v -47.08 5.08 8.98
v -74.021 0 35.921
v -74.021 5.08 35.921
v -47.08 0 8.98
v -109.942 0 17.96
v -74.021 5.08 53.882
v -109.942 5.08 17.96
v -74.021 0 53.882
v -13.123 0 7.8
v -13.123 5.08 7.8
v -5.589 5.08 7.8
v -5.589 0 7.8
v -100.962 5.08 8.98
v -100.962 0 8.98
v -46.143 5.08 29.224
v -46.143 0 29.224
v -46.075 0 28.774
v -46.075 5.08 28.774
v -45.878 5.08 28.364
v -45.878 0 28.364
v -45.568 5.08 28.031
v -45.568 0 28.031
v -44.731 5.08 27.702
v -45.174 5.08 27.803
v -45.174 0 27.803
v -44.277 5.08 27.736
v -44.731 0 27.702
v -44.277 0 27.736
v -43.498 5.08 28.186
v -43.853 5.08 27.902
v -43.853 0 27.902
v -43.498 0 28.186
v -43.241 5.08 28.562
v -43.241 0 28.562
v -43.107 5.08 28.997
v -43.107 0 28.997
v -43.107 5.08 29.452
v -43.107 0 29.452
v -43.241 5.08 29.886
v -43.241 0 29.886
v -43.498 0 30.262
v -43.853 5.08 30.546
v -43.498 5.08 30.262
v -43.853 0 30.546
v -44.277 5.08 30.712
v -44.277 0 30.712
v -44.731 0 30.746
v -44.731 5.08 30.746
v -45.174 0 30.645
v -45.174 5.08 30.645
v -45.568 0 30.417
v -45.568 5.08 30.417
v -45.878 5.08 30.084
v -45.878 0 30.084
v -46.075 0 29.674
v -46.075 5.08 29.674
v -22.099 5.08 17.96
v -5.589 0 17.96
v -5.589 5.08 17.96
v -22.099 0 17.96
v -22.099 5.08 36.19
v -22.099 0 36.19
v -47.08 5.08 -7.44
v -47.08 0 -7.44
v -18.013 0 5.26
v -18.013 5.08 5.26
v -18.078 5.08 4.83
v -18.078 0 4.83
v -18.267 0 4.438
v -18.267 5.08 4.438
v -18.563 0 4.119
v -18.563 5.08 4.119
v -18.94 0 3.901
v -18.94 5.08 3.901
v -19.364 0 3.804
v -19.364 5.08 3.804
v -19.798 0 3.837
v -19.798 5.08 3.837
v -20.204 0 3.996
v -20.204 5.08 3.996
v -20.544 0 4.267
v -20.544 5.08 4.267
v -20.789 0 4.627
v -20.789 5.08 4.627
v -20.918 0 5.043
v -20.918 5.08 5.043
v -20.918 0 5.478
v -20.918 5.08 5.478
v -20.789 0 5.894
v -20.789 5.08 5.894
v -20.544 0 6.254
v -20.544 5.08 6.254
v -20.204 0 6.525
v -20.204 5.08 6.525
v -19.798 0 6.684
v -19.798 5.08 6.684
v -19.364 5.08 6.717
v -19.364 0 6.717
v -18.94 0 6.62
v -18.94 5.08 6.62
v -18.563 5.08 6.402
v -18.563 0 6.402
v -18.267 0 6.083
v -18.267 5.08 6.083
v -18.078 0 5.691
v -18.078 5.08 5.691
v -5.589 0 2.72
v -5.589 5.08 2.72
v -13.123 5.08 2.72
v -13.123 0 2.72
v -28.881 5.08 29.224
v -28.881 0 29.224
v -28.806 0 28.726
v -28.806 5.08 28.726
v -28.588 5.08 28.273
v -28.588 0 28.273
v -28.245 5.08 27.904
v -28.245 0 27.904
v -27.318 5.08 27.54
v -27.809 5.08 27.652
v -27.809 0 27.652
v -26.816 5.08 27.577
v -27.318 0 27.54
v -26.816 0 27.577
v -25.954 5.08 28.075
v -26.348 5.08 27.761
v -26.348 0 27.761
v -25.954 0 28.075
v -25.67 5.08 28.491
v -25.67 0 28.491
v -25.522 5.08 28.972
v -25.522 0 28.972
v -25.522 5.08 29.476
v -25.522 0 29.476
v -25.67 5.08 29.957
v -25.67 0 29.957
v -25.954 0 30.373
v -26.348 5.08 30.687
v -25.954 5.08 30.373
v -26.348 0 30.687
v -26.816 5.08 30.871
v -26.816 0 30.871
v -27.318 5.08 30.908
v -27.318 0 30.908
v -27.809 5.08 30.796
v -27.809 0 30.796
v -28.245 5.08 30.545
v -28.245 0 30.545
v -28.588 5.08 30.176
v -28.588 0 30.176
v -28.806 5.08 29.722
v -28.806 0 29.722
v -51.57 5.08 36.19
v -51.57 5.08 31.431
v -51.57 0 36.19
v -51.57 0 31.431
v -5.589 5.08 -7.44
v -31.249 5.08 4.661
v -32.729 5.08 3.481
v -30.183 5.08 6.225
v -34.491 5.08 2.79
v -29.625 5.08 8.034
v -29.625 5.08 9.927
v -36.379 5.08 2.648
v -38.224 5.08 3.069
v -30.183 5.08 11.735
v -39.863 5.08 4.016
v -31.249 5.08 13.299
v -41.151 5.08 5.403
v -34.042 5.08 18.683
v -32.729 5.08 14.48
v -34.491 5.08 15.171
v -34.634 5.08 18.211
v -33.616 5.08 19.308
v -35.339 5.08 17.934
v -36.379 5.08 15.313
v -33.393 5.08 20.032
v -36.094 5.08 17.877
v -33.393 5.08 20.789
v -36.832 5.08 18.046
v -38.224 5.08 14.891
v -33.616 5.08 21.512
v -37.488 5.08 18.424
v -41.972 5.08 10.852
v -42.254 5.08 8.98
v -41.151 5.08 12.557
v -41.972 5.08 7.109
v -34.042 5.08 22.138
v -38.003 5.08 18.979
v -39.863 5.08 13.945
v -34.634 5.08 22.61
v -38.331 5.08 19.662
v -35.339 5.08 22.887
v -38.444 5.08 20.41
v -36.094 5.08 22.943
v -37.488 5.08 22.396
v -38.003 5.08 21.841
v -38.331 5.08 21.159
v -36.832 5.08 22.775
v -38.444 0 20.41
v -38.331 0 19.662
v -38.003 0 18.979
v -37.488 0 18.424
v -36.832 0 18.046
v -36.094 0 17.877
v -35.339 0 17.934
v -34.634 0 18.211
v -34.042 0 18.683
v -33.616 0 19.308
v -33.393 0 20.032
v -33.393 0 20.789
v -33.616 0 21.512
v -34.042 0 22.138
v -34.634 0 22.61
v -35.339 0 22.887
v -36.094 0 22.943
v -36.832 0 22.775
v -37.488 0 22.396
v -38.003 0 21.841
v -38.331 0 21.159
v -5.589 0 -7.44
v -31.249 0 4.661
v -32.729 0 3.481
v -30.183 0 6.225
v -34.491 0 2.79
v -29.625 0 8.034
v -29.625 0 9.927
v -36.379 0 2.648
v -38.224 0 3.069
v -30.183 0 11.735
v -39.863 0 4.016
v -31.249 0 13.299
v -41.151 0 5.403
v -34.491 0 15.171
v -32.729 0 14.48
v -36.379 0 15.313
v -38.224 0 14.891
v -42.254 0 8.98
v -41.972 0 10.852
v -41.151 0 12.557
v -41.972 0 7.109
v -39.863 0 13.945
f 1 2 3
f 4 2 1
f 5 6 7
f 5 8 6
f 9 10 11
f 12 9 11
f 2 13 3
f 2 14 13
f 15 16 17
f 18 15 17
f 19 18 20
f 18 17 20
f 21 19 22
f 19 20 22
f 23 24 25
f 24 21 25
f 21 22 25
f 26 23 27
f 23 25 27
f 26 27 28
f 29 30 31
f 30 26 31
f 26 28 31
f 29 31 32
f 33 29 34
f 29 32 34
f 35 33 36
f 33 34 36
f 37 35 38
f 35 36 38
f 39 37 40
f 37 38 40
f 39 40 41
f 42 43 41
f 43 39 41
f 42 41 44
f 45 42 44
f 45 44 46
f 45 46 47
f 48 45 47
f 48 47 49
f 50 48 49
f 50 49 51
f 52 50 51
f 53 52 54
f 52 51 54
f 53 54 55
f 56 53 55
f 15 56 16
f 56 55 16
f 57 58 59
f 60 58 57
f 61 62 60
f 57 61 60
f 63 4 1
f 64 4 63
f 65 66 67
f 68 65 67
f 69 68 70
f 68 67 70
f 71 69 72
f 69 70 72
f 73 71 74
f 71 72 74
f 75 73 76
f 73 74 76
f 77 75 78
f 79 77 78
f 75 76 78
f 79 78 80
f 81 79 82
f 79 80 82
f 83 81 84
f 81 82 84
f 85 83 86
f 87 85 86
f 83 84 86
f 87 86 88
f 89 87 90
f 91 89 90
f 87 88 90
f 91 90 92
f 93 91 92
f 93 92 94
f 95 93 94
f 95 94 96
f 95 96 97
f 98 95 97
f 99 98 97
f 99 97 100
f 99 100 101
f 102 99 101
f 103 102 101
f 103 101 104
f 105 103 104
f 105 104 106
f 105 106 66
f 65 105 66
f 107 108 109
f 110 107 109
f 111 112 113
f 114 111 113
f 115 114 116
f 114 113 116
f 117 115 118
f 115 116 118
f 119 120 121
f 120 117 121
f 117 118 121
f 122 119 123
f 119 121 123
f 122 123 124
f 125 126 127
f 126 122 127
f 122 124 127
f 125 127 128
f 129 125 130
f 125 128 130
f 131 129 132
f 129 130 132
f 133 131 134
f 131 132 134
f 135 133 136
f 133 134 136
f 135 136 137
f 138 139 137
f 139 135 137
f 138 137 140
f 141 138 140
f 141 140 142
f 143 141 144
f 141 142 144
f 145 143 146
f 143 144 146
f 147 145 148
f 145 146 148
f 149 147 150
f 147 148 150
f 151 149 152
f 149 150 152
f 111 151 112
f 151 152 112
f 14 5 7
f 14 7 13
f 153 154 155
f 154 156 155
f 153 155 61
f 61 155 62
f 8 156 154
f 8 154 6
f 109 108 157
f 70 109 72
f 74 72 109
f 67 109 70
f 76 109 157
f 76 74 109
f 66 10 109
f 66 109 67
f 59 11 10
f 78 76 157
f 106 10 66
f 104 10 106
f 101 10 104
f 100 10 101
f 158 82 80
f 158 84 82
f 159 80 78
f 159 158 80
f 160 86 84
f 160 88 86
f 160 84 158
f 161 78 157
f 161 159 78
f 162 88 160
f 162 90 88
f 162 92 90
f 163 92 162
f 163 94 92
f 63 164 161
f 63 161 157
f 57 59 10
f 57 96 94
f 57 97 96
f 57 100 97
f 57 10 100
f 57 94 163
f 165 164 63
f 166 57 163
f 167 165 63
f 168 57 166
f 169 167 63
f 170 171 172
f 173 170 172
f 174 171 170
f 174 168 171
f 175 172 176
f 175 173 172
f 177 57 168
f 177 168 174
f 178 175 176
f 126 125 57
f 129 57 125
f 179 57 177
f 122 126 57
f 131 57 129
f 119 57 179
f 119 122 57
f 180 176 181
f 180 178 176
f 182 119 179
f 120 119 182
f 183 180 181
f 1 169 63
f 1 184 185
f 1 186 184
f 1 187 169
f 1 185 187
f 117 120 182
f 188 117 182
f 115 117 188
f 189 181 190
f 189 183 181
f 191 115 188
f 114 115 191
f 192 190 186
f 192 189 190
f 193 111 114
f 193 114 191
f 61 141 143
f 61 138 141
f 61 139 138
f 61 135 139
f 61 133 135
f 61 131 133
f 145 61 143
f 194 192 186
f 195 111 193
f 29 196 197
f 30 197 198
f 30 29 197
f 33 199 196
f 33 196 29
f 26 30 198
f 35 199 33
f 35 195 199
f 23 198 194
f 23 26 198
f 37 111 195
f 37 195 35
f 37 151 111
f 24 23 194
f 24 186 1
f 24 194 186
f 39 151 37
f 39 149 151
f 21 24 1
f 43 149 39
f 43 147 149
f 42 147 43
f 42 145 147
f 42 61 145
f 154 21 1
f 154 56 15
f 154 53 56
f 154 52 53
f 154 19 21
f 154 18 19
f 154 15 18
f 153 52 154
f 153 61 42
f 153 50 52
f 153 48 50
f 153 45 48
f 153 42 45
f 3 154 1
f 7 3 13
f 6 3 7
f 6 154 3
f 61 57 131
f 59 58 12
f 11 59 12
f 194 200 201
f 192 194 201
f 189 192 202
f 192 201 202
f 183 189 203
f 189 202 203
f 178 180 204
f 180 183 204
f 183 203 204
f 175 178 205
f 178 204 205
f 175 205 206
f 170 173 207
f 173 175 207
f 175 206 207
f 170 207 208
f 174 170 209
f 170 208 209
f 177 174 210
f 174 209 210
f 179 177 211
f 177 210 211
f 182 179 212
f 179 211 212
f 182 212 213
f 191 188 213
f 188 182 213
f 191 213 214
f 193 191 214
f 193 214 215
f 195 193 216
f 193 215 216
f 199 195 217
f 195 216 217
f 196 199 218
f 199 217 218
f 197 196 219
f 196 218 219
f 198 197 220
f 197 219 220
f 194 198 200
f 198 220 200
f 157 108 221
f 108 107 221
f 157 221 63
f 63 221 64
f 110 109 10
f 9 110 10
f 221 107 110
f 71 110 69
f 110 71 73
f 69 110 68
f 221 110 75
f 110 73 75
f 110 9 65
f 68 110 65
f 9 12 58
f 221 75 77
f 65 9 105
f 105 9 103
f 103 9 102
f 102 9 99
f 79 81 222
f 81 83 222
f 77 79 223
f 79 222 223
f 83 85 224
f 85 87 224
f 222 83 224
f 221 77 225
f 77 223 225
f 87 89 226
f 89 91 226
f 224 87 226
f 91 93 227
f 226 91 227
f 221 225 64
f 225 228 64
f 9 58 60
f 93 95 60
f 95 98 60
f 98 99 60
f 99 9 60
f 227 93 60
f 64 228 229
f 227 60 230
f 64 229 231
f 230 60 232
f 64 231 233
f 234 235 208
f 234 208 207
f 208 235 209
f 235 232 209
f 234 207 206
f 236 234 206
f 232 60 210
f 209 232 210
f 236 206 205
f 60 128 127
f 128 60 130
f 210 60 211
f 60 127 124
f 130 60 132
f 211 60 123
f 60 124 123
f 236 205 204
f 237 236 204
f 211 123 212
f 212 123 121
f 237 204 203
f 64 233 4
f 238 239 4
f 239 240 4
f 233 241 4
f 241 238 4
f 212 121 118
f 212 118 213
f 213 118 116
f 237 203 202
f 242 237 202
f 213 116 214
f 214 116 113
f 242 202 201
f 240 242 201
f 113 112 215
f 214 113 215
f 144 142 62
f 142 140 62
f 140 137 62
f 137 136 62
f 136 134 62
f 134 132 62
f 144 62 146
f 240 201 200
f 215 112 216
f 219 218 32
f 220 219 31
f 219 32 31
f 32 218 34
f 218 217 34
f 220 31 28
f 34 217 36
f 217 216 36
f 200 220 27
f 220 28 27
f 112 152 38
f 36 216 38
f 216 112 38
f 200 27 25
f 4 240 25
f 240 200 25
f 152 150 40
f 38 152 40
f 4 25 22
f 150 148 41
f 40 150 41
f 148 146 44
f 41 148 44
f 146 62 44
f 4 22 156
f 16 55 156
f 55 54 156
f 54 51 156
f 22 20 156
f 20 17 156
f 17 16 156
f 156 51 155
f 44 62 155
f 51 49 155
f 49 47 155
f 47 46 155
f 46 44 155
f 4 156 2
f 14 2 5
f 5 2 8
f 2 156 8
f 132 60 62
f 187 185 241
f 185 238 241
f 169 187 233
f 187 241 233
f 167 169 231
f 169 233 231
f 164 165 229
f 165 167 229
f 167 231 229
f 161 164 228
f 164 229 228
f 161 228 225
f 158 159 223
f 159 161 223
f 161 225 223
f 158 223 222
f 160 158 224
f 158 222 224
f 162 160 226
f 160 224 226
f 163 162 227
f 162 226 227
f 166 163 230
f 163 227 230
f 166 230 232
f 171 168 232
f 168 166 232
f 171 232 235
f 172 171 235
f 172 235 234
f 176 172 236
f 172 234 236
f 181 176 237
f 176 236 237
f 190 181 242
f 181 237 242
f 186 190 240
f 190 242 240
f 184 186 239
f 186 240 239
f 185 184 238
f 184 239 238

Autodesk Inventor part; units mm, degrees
ref_plane "YZ Plane" through (0, 0, 0) normal (1, 0, 0) x (0, 1, 0)
ref_plane "XZ Plane" through (0, 0, 0) normal (0, 1, 0) x (-1, 0, 0)
ref_plane "XY Plane" through (0, 0, 0) normal (0, 0, 1) x (1, 0, 0)
sketch "Sketch1" plane through (0, 0, 0) normal (0, 1, 0) x (-1, 0, 0)
  line L0 (51.5704, 31.4309) -> (74.021, 53.8815)
  line L1 (74.021, 53.8815) -> (109.942, 17.9605)
  line L2 (109.942, 17.9605) -> (100.9618, 8.9803)
  line L3 (100.9618, 8.9803) -> (74.021, 35.921)
  line L4 (74.021, 35.921) -> (47.0803, 8.9803)
  line L5 (100.9618, 8.9803) -> (107.5624, 2.3796) construction
  line L6 (35.9043, 29.2241) -> (44.6165, 29.2241) construction
  line L7 (35.9043, 29.2241) -> (27.1921, 29.2241) construction
  circle A0 centre (44.6165, 29.2241) radius 1.5263
  circle A1 centre (27.1921, 29.2241) radius 1.6891
  circle A2 centre (35.9043, 20.4103) radius 2.54
  circle A3 centre (35.9043, 8.9803) radius 6.35
  line L8 (51.5704, 31.4309) -> (51.5704, 36.1902)
  line L9 (51.5704, 36.1902) -> (22.0986, 36.1902)
  line L10 (22.0986, 36.1902) -> (22.0986, 17.9605)
  line L11 (47.0803, 8.9803) -> (47.0803, 0)
  line L12 (5.5886, 17.9605) -> (22.0986, 17.9605)
  line L13 (5.5886, 17.9605) -> (5.5886, -7.4395)
  line L14 (5.5886, -7.4395) -> (47.0803, -7.4395)
  line L15 (47.0803, -7.4395) -> (47.0803, 0)
  point P0 (0, 0)
  dimension "d1" = 12.7
  dimension "d3" = 38.1
  dimension "d5" = 12.7
  dimension "d19" = 8.7122
  dimension "d20" = 8.7122
  dimension "d23" = 5.08
  dimension "d24" = 25.4
  dimension "d38" = 16.51
  dimension "d39" = 29.4718
extrude "Extrusion1" add sketch "Sketch1" along normal blind 5.08
sketch "Sketch2" plane through (0, 5.08, 0) normal (0, 1, 0) x (1, 0, 0)
  line L0 (-5.5886, -17.9605) -> (-5.5886, 7.4395) projected
  line L1 (-13.1234, -2.7205) -> (-13.1234, -7.8005)
  line L2 (-13.1234, -5.2605) -> (-2.9634, -5.2605) construction
  line L3 (-5.5886, 7.4395) -> (-47.0803, 7.4395) construction
  line L4 (-22.0986, -17.9605) -> (-5.5886, -17.9605) construction
  line L5 (-13.1234, -7.8005) -> (-2.9634, -7.8005)
  line L6 (-2.9634, -7.8005) -> (-2.9634, -2.7205)
  line L7 (-2.9634, -2.7205) -> (-13.1234, -2.7205)
  line L8 (-13.1234, -2.7205) -> (-13.1234, -7.8005)
  line L9 (-47.0803, 7.4395) -> (-47.0803, -8.9803) projected
  point P0 (0, 0)
  point P1 (-5.5886, -2.7205)
  point P2 (-5.5886, -7.8005)
  dimension "d29" = 5.08
  dimension "d30" = 12.7
  dimension "d31" = 25.4
  dimension "d40" = 33.9568
  dimension "d41" = 10.16
extrude "Extrusion2" cut sketch "Sketch2" against normal blind 25.4 contours L5 L1 L7 L0
sketch "Sketch3" plane through (0, 5.08, 0) normal (0, 1, 0) x (1, 0, 0)
  circle A0 centre (-19.4734, -5.2605) radius 1.4605
  line L0 (-13.1234, -7.8005) -> (-13.1234, -2.7205) projected
  line L1 (-13.1234, -5.2605) -> (-2.0744, -5.2605) construction
  point P0 (0, 0)
  dimension "d34" = 6.35
  dimension "d35" = 2.921
extrude "Extrusion3" cut sketch "Sketch3" against normal blind 25.4
sketch "Sketch4" plane through (0, 5.08, 0) normal (0, 1, 0) x (1, 0, 0)
  circle A0 centre (-19.4734, -5.2605) radius 1.4605 projected
  line L0 (-13.1234, -2.7205) -> (-5.5886, -2.7205) projected
  line L1 (-5.5886, -2.7205) -> (-5.5886, 7.4395) projected
  line L2 (-5.5886, 7.4395) -> (-47.0803, 7.4395) projected
  line L3 (-47.0803, 7.4395) -> (-47.0803, -8.9803) projected
  line L4 (-47.0803, -8.9803) -> (-74.021, -35.921) projected
  line L5 (-74.021, -35.921) -> (-100.9618, -8.9803) projected
  line L6 (-100.9618, -8.9803) -> (-109.942, -17.9605) projected
  line L7 (-109.942, -17.9605) -> (-74.021, -53.8815) projected
  line L8 (-74.021, -53.8815) -> (-51.5704, -31.4309) projected
  line L9 (-51.5704, -31.4309) -> (-51.5704, -36.1902) projected
  line L10 (-51.5704, -36.1902) -> (-22.0986, -36.1902) projected
  line L11 (-22.0986, -36.1902) -> (-22.0986, -17.9605) projected
  line L12 (-22.0986, -17.9605) -> (-5.5886, -17.9605) projected
  line L13 (-5.5886, -17.9605) -> (-5.5886, -7.8005) projected
  line L14 (-5.5886, -7.8005) -> (-13.1234, -7.8005) projected
  line L15 (-13.1234, -7.8005) -> (-13.1234, -2.7205) projected
  circle A1 centre (-44.6165, -29.2241) radius 1.5263 projected
  circle A2 centre (-27.1921, -29.2241) radius 1.6891 projected
  circle A3 centre (-35.9043, -20.4103) radius 2.54 projected
  circle A4 centre (-35.9043, -8.9803) radius 6.35 projected
  point P0 (0, 0)
properties part number "gripper laser cut"
